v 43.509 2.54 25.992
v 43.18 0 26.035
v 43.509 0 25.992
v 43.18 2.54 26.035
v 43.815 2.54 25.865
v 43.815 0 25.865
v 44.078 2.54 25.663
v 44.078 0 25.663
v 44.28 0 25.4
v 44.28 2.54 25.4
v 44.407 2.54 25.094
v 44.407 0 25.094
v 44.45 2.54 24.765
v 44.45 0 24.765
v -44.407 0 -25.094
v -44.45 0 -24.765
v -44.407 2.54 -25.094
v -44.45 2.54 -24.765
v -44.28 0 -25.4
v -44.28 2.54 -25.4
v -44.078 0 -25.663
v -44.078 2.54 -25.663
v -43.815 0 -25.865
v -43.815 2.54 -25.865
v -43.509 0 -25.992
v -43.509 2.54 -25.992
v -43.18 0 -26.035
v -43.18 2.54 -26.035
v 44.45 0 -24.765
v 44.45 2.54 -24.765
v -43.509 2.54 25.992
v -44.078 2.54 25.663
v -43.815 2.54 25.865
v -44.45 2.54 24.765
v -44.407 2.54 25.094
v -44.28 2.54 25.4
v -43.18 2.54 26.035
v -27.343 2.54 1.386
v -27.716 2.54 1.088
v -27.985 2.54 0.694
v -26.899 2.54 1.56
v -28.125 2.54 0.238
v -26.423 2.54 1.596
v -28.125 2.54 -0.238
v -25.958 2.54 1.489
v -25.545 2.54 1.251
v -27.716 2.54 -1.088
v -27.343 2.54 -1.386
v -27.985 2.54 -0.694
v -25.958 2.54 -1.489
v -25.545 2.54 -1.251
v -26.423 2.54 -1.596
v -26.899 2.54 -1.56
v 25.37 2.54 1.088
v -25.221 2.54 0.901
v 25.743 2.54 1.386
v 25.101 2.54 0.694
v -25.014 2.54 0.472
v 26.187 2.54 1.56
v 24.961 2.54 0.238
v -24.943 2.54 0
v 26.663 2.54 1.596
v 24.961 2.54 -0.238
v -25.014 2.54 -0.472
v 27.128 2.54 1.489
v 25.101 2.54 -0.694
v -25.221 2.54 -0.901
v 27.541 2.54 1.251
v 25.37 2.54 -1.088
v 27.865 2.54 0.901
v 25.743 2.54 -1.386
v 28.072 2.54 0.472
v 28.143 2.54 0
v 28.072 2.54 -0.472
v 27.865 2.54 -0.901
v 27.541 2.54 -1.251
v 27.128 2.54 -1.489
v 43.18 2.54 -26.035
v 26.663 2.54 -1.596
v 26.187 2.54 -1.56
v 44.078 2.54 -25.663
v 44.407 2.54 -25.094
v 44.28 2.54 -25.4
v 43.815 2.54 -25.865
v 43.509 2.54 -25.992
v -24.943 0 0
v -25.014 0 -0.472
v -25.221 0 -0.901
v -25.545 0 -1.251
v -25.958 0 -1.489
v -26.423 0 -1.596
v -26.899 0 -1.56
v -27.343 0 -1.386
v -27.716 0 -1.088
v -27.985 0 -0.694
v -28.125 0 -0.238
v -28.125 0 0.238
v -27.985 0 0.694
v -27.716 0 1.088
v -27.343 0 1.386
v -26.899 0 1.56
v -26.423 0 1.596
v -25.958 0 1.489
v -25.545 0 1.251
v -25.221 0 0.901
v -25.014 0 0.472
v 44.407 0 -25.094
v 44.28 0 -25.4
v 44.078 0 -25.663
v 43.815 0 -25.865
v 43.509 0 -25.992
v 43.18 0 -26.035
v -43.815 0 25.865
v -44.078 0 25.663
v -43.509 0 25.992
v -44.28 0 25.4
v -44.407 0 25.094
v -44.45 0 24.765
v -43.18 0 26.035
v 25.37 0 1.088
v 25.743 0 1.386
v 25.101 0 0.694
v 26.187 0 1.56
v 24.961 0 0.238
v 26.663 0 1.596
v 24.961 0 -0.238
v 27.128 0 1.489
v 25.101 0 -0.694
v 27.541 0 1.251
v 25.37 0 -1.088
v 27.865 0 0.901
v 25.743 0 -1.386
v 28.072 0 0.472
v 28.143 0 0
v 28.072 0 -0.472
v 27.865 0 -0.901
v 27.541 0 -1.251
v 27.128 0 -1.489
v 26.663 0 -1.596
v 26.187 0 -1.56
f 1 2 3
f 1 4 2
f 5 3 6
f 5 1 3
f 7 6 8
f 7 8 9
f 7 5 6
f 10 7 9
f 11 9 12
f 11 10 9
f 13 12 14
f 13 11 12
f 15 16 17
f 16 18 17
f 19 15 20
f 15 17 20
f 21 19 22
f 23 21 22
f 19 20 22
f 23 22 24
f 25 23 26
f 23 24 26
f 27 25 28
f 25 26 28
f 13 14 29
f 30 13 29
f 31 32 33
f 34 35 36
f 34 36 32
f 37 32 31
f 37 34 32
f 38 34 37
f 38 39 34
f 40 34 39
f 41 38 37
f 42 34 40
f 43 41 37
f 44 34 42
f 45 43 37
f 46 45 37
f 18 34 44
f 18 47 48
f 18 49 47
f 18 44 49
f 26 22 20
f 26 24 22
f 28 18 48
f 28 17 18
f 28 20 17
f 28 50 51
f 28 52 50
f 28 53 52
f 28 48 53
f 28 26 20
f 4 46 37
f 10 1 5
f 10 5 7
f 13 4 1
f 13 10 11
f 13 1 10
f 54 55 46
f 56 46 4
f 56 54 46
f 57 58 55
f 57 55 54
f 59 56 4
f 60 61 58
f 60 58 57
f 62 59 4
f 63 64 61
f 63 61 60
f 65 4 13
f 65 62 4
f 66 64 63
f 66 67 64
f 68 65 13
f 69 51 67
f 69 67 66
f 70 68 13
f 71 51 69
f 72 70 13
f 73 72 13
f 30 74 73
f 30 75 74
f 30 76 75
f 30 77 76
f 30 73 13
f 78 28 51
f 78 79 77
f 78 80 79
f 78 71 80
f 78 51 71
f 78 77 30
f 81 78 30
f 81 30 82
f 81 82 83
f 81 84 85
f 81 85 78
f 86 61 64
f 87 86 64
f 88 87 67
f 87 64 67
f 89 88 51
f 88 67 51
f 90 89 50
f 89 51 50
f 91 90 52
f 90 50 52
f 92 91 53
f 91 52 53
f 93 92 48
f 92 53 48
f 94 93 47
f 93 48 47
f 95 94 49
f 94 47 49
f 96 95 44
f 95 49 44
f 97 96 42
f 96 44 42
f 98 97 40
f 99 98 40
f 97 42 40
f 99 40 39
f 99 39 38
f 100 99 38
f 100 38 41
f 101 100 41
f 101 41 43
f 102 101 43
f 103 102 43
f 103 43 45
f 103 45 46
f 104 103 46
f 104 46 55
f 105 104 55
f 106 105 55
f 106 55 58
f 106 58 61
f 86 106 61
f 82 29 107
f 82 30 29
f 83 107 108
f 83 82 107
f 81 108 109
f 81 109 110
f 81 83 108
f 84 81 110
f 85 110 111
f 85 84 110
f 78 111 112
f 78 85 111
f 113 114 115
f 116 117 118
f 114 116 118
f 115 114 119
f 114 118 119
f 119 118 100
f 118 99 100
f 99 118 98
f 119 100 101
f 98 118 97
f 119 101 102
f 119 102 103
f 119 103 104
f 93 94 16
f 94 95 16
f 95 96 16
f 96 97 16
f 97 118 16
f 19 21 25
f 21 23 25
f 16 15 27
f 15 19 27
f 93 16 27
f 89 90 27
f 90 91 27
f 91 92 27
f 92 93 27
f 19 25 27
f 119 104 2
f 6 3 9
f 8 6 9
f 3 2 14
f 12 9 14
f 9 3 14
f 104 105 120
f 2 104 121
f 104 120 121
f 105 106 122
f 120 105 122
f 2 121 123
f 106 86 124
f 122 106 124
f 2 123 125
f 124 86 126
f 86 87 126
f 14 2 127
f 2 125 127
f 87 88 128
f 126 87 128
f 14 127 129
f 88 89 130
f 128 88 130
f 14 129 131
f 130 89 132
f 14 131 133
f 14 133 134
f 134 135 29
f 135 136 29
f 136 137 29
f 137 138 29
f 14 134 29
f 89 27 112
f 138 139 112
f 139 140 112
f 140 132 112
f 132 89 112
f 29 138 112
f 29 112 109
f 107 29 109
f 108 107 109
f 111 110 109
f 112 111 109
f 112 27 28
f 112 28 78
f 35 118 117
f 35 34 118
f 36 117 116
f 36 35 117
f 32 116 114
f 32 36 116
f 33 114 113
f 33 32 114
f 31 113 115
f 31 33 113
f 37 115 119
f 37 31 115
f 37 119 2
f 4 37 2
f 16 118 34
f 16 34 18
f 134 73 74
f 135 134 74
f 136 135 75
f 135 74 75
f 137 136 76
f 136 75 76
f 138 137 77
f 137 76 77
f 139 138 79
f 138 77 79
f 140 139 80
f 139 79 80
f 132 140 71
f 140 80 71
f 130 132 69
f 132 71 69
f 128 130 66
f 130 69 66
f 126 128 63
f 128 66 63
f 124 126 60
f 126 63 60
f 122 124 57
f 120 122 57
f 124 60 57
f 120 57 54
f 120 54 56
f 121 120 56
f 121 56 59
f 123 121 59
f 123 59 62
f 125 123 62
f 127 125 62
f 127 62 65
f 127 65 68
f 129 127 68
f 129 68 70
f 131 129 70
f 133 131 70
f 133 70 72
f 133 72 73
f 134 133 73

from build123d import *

# Parameters (mm, degrees)
SKETCH1_W           = 88.9
SKETCH1_H           = 52.07
BOSS_EXTRUDE1_DEPTH = 2.54
FILLET1_R           = 1.27
SKETCH2_R           = 1.6
CUT_EXTRUDE1_DEPTH  = 7.62


with BuildPart() as part:
    # Sketch1 → Boss-Extrude1 (new body)
    with BuildSketch(Plane(origin=(0, 0, 0), x_dir=(1, 0, 0), z_dir=(0, 1, 0))):
        Rectangle(SKETCH1_W, SKETCH1_H)
    extrude(amount=BOSS_EXTRUDE1_DEPTH)

    # Fillet1
    fillet1_edges = [part.edges().sort_by_distance(p)[0] for p in [
        (-44.45, 1.27, -26.035),
        (44.45, 1.27, -26.035),
        (44.45, 1.27, 26.035),
        (-44.45, 1.27, 26.035),
    ]]
    fillet(fillet1_edges, radius=FILLET1_R)

    # Sketch2 → Cut-Extrude1 (cut)
    with BuildSketch(Plane(origin=(0, 2.54, 0), x_dir=(1, 0, 0), z_dir=(0, 1, 0))):
        with Locations((-26.543, 0)):
            Circle(SKETCH2_R)
        with Locations((26.543, 0)):
            Circle(SKETCH2_R)
    extrude(amount=-CUT_EXTRUDE1_DEPTH, mode=Mode.SUBTRACT)


solid = part.part
